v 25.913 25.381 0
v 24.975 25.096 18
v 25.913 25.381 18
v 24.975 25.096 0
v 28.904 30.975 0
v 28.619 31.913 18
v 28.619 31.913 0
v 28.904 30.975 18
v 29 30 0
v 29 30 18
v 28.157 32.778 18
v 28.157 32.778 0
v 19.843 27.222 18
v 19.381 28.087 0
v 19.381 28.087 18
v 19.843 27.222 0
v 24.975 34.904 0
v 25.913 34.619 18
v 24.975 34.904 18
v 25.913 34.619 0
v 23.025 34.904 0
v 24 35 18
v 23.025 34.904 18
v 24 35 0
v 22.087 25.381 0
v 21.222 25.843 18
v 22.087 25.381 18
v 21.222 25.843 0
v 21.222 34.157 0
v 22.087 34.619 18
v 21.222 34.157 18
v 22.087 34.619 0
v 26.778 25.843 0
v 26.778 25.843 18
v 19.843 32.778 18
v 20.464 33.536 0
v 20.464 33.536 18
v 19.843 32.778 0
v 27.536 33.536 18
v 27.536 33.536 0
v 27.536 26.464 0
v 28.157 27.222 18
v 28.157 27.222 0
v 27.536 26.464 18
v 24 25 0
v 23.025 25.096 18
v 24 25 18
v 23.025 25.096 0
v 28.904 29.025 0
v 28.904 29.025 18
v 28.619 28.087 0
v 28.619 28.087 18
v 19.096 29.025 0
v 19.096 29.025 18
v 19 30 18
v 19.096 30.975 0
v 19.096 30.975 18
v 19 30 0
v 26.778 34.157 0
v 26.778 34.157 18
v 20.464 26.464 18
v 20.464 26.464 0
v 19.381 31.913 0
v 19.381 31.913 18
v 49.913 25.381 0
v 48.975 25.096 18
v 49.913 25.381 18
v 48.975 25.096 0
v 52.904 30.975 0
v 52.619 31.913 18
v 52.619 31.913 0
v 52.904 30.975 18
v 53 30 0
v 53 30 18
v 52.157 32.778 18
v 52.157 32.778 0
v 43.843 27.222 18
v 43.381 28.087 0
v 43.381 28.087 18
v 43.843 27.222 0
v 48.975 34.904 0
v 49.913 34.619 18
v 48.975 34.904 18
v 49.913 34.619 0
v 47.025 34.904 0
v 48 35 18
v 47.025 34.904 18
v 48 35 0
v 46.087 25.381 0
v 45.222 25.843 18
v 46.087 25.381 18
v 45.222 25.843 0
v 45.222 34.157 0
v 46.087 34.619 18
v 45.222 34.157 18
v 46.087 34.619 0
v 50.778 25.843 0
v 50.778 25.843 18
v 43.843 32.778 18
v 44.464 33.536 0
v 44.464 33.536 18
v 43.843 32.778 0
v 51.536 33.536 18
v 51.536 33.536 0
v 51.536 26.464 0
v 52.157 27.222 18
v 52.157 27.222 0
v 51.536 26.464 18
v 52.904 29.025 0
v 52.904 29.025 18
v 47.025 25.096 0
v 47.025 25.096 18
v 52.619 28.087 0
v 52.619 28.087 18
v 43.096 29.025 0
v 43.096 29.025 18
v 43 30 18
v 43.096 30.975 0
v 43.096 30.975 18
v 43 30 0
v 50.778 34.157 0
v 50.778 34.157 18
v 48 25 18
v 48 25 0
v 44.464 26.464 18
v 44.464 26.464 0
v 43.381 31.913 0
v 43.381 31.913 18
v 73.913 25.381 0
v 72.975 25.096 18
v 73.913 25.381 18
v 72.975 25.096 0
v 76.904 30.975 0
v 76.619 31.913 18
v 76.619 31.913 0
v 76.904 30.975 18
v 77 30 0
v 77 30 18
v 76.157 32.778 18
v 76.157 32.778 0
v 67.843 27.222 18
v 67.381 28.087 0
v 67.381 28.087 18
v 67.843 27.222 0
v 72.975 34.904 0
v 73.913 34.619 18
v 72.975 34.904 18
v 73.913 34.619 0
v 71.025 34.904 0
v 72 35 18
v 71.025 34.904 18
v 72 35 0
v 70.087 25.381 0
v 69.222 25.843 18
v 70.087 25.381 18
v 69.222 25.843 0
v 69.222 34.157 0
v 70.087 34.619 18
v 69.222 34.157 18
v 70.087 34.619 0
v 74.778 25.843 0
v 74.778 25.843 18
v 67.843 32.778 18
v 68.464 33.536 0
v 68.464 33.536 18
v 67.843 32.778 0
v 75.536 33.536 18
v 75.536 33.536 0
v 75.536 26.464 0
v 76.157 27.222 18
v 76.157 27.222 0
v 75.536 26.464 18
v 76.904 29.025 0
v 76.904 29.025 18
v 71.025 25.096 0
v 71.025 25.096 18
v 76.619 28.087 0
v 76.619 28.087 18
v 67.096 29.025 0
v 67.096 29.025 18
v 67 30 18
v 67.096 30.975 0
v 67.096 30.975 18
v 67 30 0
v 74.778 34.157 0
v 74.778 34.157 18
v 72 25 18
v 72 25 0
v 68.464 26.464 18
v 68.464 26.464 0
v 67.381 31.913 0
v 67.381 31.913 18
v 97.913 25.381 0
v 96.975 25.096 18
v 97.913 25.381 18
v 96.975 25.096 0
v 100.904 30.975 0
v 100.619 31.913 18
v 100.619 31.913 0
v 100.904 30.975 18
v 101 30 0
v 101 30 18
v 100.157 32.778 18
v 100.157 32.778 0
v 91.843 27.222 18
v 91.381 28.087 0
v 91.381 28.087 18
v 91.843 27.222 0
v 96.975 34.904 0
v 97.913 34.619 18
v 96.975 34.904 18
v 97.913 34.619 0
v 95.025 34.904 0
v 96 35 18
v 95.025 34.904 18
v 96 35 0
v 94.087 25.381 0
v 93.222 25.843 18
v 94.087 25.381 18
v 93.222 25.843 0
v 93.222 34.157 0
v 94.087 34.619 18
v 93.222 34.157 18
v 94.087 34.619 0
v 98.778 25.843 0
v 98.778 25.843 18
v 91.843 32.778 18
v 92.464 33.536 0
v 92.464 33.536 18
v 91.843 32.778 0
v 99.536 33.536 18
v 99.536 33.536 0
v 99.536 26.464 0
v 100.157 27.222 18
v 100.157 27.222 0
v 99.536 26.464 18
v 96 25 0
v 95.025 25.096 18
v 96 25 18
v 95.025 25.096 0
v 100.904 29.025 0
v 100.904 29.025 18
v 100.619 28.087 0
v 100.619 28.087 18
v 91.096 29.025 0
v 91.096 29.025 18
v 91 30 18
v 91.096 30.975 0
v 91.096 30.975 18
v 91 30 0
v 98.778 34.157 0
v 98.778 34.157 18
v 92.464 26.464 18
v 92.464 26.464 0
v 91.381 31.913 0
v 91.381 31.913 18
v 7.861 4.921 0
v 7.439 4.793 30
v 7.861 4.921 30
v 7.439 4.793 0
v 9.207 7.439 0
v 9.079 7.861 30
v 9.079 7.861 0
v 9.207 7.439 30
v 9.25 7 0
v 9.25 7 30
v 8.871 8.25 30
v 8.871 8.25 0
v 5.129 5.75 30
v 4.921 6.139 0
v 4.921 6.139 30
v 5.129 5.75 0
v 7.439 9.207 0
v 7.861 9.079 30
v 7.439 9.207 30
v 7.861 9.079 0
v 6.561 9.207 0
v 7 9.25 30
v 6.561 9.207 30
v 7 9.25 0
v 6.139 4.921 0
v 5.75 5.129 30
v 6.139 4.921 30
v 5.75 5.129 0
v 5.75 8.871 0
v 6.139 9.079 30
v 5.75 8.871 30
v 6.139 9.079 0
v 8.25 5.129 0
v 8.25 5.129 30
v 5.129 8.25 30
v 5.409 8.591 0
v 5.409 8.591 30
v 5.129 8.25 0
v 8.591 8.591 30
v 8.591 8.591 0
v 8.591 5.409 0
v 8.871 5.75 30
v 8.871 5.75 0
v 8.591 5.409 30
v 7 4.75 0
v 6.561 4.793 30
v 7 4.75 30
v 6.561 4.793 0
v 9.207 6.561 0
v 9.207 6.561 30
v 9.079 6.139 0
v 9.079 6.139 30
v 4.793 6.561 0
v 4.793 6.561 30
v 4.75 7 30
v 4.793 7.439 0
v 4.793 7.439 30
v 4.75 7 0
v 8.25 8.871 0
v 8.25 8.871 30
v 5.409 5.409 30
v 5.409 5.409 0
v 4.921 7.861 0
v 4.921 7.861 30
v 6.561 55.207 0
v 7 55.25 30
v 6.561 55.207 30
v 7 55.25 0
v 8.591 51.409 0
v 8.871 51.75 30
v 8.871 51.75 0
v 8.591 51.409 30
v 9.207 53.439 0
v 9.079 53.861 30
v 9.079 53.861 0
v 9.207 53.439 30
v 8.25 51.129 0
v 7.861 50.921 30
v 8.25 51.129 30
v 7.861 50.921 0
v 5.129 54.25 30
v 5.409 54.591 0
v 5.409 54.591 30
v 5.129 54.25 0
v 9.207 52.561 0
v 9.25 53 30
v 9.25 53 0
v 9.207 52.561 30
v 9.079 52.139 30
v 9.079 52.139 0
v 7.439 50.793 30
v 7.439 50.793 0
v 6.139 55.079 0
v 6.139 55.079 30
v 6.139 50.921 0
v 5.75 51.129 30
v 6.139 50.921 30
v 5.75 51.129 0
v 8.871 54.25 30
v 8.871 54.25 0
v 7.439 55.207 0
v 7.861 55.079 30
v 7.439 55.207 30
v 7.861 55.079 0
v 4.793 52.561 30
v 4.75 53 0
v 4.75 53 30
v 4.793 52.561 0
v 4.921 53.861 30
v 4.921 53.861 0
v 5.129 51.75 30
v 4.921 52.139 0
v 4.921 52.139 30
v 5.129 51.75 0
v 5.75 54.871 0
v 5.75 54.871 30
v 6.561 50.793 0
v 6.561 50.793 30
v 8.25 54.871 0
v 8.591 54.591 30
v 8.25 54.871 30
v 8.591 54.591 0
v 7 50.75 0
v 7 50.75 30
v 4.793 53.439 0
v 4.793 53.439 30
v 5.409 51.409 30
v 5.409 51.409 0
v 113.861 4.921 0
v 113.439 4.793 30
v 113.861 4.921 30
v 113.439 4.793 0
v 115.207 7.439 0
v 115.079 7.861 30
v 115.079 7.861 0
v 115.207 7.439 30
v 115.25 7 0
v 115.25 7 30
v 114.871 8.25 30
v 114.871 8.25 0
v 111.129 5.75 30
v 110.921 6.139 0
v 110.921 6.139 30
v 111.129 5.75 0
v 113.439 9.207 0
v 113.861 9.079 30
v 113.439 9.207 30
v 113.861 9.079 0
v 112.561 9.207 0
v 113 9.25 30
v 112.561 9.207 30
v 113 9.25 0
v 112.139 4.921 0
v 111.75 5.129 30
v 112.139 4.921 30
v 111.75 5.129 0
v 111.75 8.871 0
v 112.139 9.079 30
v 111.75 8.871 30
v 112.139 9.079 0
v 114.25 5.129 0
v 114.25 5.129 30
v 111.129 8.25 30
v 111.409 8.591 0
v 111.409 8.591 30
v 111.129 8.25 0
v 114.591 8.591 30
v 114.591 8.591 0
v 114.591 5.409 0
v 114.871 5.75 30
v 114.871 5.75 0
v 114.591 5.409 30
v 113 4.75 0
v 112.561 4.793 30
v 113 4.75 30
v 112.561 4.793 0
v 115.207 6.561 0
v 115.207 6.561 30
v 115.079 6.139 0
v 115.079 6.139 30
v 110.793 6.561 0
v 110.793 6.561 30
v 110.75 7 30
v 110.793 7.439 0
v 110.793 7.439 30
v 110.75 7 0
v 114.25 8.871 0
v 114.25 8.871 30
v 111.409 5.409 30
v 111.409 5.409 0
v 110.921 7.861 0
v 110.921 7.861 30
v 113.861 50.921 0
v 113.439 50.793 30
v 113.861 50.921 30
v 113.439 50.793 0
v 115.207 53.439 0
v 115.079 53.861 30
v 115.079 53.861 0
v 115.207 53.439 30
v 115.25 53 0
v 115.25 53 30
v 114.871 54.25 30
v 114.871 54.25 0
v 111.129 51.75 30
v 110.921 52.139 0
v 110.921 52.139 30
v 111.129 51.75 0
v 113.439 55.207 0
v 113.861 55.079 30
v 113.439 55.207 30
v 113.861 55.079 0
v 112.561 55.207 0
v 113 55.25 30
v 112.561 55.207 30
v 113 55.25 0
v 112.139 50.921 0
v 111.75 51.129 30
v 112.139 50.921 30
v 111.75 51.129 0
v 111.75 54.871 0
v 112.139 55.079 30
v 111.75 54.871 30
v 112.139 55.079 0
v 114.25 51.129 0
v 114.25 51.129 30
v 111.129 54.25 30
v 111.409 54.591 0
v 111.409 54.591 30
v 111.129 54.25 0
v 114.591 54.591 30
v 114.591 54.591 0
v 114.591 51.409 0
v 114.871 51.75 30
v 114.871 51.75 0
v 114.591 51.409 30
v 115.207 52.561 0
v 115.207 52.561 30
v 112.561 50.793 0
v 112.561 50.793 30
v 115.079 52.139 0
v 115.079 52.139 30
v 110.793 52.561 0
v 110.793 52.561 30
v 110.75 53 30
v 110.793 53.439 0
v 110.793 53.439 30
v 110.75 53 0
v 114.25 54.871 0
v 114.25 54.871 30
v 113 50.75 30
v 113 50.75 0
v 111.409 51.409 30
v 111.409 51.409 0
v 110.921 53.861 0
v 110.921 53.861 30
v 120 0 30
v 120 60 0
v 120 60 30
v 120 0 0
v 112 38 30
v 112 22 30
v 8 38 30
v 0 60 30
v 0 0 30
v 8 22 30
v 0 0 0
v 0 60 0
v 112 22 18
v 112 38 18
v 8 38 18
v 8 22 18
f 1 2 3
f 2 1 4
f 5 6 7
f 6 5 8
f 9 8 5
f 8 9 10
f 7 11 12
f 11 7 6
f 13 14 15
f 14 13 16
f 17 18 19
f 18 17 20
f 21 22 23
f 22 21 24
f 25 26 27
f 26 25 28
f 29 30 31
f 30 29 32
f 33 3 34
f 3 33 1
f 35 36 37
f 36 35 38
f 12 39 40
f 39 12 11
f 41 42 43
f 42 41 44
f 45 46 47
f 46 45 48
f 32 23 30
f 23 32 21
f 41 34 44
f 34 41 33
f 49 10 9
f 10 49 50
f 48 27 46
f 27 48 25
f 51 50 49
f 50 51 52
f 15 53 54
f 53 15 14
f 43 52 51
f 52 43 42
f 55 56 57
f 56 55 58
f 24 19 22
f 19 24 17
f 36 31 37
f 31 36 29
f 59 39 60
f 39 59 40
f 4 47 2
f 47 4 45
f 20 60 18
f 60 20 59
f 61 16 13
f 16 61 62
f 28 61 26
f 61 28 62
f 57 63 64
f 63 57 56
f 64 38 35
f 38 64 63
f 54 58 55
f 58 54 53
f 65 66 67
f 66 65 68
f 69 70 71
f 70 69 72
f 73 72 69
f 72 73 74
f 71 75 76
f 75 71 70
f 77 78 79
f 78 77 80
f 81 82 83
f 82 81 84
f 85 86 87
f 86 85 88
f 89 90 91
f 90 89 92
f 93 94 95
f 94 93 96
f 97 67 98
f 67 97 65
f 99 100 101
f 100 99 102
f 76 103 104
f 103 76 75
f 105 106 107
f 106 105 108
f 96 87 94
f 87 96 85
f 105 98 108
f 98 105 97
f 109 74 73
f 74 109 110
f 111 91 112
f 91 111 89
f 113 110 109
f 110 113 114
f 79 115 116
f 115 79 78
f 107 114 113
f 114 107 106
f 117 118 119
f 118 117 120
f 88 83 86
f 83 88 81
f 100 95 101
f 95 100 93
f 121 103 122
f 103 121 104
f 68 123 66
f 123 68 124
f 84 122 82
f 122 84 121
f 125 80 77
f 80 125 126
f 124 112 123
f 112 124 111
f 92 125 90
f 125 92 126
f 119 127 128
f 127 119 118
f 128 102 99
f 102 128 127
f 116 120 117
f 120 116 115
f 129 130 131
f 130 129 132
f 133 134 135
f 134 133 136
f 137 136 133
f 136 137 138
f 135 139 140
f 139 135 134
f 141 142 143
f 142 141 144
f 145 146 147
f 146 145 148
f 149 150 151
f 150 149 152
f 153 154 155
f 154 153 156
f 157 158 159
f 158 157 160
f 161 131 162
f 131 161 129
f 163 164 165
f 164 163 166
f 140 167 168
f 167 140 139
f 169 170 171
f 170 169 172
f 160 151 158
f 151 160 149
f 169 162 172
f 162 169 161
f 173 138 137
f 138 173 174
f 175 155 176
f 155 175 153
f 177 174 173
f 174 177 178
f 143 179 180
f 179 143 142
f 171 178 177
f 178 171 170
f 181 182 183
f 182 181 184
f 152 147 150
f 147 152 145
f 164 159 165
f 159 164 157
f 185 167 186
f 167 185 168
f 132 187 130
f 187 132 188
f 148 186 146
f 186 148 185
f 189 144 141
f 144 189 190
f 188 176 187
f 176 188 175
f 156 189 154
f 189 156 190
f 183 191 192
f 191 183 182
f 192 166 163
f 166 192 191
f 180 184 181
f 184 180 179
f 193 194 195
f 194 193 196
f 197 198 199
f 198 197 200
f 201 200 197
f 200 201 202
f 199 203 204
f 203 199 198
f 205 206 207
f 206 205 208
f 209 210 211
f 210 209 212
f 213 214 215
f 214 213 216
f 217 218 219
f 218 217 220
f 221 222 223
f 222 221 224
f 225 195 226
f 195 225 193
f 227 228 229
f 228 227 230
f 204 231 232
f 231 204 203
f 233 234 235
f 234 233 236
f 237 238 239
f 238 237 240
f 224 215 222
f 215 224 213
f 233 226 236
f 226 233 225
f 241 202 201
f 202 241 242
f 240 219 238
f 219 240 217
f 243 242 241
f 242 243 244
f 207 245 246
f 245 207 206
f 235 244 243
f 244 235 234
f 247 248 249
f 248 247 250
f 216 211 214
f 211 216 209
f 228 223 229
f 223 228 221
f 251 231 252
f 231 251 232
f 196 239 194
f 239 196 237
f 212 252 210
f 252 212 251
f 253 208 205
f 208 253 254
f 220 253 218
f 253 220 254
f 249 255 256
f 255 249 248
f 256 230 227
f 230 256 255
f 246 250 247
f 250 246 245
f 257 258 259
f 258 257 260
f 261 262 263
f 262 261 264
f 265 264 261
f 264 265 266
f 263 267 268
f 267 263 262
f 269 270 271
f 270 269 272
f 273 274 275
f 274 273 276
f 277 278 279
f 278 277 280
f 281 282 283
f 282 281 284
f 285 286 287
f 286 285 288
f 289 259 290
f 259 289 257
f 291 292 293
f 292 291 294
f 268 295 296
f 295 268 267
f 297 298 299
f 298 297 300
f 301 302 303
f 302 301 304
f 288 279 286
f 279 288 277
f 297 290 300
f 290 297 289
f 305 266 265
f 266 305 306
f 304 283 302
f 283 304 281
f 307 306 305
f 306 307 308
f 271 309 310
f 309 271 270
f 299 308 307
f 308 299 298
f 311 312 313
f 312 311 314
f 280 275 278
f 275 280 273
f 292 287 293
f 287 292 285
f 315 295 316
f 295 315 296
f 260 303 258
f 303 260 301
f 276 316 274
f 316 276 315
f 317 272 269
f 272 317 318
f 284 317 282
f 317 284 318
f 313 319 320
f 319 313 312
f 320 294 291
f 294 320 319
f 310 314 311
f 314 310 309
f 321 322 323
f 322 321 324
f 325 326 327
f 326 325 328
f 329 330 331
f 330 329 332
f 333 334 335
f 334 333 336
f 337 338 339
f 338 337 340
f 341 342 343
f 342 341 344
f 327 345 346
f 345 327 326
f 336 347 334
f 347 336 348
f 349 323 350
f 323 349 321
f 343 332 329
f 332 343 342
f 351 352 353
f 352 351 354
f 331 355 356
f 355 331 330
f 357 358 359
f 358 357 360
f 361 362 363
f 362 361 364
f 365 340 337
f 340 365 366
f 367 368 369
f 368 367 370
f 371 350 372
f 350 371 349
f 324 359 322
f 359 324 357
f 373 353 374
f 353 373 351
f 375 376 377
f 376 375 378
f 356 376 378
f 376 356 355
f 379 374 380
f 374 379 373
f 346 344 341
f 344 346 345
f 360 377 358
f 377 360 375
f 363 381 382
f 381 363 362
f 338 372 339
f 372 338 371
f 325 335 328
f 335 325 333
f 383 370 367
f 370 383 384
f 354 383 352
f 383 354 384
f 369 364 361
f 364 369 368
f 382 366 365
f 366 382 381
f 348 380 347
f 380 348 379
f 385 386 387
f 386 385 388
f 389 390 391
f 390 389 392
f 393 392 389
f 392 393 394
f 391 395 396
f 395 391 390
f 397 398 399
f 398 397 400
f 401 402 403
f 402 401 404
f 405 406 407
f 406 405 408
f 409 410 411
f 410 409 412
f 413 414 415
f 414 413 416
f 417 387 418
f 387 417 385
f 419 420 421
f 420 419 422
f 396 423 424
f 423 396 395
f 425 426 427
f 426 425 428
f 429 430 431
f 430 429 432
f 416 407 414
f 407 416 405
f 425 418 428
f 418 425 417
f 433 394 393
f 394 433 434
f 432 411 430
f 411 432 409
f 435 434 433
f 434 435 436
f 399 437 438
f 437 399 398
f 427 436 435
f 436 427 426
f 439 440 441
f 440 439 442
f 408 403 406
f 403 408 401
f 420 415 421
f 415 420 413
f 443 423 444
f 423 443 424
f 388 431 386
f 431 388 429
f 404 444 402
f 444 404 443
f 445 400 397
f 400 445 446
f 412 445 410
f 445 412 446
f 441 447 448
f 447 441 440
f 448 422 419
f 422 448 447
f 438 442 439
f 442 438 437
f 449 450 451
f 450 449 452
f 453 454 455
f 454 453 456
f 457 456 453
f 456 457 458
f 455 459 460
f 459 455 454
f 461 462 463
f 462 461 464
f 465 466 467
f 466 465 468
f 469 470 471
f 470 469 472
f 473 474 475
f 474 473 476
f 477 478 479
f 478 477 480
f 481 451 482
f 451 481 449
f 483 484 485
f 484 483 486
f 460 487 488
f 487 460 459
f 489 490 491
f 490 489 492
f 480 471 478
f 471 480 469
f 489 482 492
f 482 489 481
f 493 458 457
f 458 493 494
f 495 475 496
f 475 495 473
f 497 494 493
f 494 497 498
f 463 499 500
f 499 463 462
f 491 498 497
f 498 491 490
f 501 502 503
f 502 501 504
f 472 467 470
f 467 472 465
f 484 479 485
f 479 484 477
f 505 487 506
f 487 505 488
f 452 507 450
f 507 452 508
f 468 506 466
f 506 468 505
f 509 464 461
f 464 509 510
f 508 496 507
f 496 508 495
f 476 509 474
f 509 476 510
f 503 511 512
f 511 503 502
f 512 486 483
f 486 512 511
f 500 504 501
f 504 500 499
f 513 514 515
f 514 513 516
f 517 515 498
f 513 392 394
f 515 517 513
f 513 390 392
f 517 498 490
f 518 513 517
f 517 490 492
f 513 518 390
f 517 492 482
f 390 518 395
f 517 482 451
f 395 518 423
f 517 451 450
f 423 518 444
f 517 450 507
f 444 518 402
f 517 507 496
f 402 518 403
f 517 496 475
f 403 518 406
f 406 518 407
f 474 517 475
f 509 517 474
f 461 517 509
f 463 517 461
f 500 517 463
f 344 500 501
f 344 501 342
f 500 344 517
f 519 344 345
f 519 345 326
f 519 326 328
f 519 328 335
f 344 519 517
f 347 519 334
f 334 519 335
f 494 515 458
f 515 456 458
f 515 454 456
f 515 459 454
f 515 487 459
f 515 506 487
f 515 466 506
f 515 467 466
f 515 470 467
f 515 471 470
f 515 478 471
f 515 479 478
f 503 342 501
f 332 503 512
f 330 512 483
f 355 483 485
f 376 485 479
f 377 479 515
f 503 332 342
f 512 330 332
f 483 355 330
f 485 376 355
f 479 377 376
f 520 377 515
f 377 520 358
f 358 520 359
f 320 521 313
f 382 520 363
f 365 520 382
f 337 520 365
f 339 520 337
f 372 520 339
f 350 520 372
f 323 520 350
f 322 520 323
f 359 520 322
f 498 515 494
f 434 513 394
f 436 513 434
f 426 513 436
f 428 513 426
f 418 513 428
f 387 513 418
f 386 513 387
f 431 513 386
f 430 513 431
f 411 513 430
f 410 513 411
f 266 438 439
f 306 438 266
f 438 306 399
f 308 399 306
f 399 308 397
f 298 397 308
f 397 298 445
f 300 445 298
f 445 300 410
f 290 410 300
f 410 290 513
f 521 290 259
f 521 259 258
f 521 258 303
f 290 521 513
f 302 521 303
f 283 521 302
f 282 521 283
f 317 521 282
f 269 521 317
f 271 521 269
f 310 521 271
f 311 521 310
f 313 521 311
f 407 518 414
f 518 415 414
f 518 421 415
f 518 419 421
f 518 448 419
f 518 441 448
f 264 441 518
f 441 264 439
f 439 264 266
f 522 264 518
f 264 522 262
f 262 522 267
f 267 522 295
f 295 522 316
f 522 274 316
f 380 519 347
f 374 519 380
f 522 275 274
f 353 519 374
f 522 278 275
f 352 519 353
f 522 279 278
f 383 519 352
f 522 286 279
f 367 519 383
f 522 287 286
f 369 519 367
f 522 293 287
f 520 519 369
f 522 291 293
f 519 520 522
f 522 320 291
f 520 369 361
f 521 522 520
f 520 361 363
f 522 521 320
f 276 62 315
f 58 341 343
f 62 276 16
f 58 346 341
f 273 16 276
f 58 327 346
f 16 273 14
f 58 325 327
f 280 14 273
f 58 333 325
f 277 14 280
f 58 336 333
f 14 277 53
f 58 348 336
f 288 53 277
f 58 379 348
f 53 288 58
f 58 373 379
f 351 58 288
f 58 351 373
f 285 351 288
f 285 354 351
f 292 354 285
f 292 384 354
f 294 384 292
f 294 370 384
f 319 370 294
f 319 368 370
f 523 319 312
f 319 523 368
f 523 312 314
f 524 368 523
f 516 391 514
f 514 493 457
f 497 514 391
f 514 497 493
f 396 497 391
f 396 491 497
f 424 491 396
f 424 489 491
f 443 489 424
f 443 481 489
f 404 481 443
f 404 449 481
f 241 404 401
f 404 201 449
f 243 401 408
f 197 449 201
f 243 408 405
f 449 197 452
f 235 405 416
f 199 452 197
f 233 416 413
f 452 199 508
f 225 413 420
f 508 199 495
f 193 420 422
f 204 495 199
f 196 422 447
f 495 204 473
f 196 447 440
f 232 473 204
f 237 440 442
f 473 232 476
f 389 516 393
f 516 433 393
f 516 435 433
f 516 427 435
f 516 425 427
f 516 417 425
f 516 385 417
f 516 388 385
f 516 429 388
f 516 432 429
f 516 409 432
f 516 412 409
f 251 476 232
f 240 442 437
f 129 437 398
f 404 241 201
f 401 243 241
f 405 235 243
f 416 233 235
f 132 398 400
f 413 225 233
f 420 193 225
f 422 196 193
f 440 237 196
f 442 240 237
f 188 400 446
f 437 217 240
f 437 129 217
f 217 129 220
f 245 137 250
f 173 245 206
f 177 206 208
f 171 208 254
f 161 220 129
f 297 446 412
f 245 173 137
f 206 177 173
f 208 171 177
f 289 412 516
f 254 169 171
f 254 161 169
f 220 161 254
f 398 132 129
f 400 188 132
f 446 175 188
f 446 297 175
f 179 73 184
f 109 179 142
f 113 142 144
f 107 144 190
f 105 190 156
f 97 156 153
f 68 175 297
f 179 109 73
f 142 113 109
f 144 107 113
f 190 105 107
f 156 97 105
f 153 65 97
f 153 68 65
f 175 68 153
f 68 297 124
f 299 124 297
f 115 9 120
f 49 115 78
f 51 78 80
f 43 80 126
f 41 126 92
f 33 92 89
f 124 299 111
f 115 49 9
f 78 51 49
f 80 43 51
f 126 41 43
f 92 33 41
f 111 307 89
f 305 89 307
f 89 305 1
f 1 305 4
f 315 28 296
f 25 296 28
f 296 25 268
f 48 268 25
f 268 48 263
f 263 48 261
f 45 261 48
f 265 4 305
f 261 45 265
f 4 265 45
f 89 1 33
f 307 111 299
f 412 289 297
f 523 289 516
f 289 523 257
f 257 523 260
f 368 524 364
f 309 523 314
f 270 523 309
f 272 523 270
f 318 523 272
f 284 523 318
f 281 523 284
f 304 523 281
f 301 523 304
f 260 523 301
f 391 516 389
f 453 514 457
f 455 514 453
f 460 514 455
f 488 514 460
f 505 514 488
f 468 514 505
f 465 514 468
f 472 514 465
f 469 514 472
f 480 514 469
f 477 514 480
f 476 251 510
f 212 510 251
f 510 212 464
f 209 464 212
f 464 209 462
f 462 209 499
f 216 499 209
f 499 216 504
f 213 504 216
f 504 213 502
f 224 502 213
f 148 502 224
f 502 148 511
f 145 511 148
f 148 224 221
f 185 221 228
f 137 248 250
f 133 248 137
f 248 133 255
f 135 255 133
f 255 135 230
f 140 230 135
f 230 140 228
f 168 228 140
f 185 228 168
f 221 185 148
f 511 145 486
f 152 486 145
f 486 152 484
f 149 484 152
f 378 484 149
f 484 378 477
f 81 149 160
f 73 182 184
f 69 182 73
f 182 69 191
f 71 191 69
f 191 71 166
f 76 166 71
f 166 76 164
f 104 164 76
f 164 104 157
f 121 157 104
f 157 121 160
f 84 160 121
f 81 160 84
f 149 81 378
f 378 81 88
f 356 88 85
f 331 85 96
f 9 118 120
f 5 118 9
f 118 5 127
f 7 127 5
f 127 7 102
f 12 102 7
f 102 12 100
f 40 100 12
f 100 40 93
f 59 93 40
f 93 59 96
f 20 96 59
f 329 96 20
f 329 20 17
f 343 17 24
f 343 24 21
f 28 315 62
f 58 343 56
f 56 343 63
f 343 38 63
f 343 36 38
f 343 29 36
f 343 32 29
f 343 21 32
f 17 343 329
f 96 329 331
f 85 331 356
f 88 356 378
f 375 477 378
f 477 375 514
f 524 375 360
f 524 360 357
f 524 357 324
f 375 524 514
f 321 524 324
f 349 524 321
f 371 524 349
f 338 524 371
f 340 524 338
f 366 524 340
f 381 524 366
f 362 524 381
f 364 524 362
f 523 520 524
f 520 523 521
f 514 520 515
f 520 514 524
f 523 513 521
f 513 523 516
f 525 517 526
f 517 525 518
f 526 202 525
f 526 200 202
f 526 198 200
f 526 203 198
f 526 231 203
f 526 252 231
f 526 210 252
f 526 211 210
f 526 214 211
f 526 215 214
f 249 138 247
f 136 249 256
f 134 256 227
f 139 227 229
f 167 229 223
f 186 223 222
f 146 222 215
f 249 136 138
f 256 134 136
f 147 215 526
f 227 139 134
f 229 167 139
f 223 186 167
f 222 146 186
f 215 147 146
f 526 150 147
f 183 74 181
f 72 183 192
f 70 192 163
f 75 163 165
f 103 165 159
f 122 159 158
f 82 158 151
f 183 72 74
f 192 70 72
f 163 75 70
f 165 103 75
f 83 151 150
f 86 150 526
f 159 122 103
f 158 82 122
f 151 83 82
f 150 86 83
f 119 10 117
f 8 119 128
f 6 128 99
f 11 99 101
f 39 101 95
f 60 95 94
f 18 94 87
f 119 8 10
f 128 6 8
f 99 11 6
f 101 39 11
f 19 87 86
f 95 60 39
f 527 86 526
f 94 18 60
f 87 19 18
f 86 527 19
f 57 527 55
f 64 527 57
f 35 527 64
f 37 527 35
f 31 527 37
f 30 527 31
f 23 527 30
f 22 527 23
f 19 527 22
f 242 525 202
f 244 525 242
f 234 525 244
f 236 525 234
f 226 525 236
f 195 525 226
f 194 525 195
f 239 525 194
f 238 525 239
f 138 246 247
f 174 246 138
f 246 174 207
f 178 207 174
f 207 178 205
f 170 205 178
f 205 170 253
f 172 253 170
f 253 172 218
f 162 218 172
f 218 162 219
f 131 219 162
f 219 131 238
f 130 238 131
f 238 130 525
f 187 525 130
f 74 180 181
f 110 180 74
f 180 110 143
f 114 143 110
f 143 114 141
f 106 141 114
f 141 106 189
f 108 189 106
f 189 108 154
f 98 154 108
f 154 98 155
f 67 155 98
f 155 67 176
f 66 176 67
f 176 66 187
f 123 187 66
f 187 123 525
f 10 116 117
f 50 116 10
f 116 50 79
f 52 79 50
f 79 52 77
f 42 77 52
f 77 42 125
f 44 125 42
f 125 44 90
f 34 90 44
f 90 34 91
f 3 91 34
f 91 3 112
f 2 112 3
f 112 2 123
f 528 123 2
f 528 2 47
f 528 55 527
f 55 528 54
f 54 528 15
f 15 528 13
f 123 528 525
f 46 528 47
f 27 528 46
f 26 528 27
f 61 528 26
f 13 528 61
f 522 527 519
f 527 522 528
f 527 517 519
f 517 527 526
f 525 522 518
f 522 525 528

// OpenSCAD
$fn = 32;

// ----------------------------------------------------------------------
// Manifold block: gallery_top manifold
// ----------------------------------------------------------------------

// --- parameters (mm) ---
block_l = 120;            // block length, X
block_w = 60;             // block width, Y
block_h = 30;             // block height, Z
port_d = 10;              // port bore diameter
port_pitch = 24;          // port pitch along X
gallery_d = 16;           // top gallery width, Y
gallery_depth = 12;       // gallery pocket depth
wall_p = 8;               // gallery end wall thickness, X
mnt_d = 4.5;              // mounting hole diameter
mnt_in = 7;               // mounting hole inset from the edges

n_ports = 4;  // ports in the row
port_x0 = (block_l - (n_ports - 1) * port_pitch) / 2;  // first port X

difference() {
  cube([block_l, block_w, block_h]);
  for (i = [0 : n_ports - 1])
    translate([port_x0 + i * port_pitch, block_w / 2, -1])
      cylinder(h = block_h + 2, d = port_d);
  translate([wall_p, block_w / 2 - gallery_d / 2, block_h - gallery_depth])
    cube([block_l - 2 * wall_p, gallery_d, gallery_depth + 1]);
  for (cx = [mnt_in, block_l - mnt_in])
    for (cy = [mnt_in, block_w - mnt_in])
      translate([cx, cy, -1]) cylinder(h = block_h + 2, d = mnt_d);
}
